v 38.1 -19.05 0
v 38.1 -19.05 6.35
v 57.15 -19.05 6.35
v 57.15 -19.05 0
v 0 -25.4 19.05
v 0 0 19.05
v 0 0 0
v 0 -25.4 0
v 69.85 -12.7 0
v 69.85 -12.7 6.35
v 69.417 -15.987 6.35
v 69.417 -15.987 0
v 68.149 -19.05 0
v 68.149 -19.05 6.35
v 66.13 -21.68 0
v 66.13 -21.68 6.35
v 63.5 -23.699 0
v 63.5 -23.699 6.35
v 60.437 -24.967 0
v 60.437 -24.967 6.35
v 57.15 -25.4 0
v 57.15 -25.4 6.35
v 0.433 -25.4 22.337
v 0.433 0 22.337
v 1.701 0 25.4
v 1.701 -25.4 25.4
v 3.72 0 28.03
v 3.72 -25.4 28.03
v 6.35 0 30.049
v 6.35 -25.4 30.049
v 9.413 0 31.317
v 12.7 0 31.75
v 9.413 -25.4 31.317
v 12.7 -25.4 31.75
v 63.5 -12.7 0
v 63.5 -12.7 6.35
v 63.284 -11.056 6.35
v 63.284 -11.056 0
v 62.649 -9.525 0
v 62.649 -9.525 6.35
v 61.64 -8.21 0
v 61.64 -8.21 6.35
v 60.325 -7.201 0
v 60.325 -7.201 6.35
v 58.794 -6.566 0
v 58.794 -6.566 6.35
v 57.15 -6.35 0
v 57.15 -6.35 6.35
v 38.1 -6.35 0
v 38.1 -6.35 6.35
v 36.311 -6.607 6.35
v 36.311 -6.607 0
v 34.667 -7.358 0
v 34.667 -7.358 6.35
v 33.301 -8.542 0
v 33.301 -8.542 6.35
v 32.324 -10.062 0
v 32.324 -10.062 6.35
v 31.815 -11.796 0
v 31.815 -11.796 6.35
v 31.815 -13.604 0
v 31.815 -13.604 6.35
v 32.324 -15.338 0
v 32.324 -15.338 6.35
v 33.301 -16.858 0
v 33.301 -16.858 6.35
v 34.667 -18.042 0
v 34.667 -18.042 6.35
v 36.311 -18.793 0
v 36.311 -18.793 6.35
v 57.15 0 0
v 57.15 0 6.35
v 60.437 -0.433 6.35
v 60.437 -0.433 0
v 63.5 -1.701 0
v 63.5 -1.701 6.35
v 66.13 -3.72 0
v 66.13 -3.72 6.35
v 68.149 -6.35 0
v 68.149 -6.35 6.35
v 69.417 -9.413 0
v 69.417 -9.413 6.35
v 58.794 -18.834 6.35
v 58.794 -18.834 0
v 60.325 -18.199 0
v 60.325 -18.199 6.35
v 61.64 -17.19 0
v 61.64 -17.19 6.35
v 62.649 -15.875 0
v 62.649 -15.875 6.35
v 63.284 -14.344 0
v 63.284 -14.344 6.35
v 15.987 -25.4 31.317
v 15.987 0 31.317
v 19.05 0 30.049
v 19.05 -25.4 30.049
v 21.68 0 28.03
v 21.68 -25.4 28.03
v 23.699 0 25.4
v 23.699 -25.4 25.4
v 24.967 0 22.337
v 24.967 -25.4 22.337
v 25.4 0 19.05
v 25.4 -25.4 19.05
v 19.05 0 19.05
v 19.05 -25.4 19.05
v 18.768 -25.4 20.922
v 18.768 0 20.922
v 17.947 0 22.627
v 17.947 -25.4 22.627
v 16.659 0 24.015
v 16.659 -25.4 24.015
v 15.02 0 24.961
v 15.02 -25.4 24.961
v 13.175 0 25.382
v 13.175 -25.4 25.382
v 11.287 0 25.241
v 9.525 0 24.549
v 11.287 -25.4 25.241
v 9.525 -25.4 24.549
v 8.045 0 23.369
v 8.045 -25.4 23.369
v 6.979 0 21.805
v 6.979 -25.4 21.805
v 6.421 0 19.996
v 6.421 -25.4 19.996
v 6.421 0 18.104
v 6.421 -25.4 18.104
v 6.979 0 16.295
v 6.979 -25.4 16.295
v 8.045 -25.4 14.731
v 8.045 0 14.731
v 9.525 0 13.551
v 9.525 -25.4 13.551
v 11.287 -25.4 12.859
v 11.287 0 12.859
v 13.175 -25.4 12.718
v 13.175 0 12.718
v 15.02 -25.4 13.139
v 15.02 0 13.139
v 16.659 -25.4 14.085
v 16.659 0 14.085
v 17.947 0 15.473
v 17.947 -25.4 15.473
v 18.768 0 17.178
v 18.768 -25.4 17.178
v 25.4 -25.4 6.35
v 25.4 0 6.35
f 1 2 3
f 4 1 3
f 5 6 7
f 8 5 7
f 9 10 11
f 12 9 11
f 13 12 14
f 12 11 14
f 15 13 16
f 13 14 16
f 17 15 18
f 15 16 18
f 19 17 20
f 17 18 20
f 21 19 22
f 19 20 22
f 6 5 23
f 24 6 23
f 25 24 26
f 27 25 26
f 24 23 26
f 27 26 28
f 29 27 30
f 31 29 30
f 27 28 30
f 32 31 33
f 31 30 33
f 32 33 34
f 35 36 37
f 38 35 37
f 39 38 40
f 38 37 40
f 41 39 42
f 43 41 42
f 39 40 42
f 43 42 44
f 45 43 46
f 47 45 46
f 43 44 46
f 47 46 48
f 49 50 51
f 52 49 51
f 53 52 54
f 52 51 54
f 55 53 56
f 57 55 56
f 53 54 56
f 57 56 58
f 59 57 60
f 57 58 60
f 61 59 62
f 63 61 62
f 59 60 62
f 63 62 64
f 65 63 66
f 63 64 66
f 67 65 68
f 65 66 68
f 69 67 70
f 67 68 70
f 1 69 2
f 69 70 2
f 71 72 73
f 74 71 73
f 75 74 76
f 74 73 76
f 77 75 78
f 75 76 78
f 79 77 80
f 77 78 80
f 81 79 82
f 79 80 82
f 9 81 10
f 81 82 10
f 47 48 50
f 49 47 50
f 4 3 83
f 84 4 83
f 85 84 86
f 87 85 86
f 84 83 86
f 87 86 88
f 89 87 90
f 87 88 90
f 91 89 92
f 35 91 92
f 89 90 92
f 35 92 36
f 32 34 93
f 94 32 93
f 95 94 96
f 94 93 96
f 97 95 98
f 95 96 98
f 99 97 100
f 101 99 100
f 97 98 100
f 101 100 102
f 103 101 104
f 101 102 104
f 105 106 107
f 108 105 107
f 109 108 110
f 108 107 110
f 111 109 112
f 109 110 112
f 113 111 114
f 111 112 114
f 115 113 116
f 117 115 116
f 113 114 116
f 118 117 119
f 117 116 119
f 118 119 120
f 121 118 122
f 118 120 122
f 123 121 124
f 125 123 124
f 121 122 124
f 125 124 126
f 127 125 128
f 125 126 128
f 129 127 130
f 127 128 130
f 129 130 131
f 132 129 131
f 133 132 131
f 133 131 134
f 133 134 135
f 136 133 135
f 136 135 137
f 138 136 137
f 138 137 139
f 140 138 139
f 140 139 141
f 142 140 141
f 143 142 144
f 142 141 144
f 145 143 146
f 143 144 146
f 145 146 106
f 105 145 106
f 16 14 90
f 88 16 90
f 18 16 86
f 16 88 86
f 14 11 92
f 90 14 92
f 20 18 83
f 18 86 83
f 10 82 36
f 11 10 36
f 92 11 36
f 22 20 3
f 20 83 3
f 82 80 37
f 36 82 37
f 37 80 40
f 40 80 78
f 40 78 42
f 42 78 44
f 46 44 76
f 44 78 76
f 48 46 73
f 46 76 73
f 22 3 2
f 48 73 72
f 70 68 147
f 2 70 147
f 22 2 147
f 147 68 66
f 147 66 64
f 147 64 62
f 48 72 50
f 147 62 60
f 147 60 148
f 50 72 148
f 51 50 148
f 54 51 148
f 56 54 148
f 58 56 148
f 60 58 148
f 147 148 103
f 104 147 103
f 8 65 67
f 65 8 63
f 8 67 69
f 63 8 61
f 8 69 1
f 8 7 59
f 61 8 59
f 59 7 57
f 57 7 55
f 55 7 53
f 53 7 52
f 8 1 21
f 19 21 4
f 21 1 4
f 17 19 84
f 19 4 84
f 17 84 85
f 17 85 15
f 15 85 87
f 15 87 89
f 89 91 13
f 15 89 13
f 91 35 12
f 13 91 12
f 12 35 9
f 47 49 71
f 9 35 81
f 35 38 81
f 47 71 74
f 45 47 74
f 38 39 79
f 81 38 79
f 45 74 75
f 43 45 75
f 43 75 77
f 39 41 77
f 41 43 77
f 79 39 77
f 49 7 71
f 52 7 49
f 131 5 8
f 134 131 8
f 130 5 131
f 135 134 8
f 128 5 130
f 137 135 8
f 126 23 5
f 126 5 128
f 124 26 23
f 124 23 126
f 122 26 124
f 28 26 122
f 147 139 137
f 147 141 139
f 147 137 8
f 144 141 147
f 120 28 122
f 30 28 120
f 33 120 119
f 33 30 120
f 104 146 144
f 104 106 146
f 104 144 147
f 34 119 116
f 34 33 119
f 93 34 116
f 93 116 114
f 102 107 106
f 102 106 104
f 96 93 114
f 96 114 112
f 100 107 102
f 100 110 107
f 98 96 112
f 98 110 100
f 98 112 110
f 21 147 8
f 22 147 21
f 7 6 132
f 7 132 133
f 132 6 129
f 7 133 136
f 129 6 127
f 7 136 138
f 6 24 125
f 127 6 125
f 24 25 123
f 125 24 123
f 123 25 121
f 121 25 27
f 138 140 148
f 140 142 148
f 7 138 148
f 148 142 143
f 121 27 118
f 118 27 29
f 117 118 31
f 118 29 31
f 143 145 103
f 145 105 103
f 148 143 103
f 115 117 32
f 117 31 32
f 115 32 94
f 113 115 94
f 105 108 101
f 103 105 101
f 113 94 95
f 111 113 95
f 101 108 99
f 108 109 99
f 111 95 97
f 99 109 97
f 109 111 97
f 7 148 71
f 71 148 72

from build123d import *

# Parameters (mm, degrees)
F1_DEPTH = 25.4
F2_R     = 6.35
F3_DEPTH = 25.4
F5_DEPTH = 12.7


with BuildPart() as f1:
    # F0 (on Front) → F1 (new body)
    with BuildSketch(Plane.XZ):
        Polygon((0, 31.75), (0, 0), (69.85, 0), (69.85, 6.35), (25.4, 6.35), (25.4, 31.75), align=None)
    extrude(amount=F1_DEPTH)

    # F2 (on face) → F3 (cut)
    with BuildSketch(Plane.XZ.offset(25.4)):
        with BuildLine():
            ThreePointArc((0, 19.05), (3.719744, 28.030256), (12.7, 31.75))
            Line((12.7, 31.75), (0, 31.75))
            Line((0, 31.75), (0, 19.05))
        make_face()
        with BuildLine():
            ThreePointArc((12.7, 31.75), (21.680256, 28.030256), (25.4, 19.05))
            Line((25.4, 19.05), (25.4, 31.75))
            Line((25.4, 31.75), (12.7, 31.75))
        make_face()
        with Locations((12.7, 19.05)):
            Circle(F2_R)
    extrude(amount=-F3_DEPTH, mode=Mode.SUBTRACT)

    # F4 (on face) → F5 (cut)
    with BuildSketch(Plane.XY.offset(6.35)):
        with BuildLine():
            Line((38.1, -12.7), (38.1, -6.35))
            ThreePointArc((38.1, -6.35), (31.75, -12.7), (38.1, -19.05))
            Line((38.1, -19.05), (38.1, -12.7))
        make_face()
        with BuildLine():
            ThreePointArc((44.45, -12.7), (42.590128, -8.209872), (38.1, -6.35))
            Line((38.1, -6.35), (38.1, -12.7))
            Line((38.1, -12.7), (38.1, -19.05))
            ThreePointArc((38.1, -19.05), (42.590128, -17.190128), (44.45, -12.7))
        make_face()
        with BuildLine():
            ThreePointArc((57.15, -19.05), (50.8, -12.7), (57.15, -6.35))
            Line((57.15, -6.35), (38.1, -6.35))
            ThreePointArc((38.1, -6.35), (42.590128, -8.209872), (44.45, -12.7))
            ThreePointArc((44.45, -12.7), (42.590128, -17.190128), (38.1, -19.05))
            Line((38.1, -19.05), (57.15, -19.05))
        make_face()
        with BuildLine():
            ThreePointArc((57.15, 0), (66.130256, -3.719744), (69.85, -12.7))
            Line((69.85, -12.7), (69.85, 0))
            Line((69.85, 0), (57.15, 0))
        make_face()
        with BuildLine():
            ThreePointArc((69.85, -12.7), (66.130256, -21.680256), (57.15, -25.4))
            Line((57.15, -25.4), (69.85, -25.4))
            Line((69.85, -25.4), (69.85, -12.7))
        make_face()
        with BuildLine():
            ThreePointArc((57.15, -19.05), (61.640128, -17.190128), (63.5, -12.7))
            ThreePointArc((63.5, -12.7), (61.640128, -8.209872), (57.15, -6.35))
            Line((57.15, -6.35), (57.15, -19.05))
        make_face()
        with BuildLine():
            Line((57.15, -19.05), (57.15, -6.35))
            ThreePointArc((57.15, -6.35), (50.8, -12.7), (57.15, -19.05))
        make_face()
    extrude(amount=-F5_DEPTH, mode=Mode.SUBTRACT)


solid = f1.part
